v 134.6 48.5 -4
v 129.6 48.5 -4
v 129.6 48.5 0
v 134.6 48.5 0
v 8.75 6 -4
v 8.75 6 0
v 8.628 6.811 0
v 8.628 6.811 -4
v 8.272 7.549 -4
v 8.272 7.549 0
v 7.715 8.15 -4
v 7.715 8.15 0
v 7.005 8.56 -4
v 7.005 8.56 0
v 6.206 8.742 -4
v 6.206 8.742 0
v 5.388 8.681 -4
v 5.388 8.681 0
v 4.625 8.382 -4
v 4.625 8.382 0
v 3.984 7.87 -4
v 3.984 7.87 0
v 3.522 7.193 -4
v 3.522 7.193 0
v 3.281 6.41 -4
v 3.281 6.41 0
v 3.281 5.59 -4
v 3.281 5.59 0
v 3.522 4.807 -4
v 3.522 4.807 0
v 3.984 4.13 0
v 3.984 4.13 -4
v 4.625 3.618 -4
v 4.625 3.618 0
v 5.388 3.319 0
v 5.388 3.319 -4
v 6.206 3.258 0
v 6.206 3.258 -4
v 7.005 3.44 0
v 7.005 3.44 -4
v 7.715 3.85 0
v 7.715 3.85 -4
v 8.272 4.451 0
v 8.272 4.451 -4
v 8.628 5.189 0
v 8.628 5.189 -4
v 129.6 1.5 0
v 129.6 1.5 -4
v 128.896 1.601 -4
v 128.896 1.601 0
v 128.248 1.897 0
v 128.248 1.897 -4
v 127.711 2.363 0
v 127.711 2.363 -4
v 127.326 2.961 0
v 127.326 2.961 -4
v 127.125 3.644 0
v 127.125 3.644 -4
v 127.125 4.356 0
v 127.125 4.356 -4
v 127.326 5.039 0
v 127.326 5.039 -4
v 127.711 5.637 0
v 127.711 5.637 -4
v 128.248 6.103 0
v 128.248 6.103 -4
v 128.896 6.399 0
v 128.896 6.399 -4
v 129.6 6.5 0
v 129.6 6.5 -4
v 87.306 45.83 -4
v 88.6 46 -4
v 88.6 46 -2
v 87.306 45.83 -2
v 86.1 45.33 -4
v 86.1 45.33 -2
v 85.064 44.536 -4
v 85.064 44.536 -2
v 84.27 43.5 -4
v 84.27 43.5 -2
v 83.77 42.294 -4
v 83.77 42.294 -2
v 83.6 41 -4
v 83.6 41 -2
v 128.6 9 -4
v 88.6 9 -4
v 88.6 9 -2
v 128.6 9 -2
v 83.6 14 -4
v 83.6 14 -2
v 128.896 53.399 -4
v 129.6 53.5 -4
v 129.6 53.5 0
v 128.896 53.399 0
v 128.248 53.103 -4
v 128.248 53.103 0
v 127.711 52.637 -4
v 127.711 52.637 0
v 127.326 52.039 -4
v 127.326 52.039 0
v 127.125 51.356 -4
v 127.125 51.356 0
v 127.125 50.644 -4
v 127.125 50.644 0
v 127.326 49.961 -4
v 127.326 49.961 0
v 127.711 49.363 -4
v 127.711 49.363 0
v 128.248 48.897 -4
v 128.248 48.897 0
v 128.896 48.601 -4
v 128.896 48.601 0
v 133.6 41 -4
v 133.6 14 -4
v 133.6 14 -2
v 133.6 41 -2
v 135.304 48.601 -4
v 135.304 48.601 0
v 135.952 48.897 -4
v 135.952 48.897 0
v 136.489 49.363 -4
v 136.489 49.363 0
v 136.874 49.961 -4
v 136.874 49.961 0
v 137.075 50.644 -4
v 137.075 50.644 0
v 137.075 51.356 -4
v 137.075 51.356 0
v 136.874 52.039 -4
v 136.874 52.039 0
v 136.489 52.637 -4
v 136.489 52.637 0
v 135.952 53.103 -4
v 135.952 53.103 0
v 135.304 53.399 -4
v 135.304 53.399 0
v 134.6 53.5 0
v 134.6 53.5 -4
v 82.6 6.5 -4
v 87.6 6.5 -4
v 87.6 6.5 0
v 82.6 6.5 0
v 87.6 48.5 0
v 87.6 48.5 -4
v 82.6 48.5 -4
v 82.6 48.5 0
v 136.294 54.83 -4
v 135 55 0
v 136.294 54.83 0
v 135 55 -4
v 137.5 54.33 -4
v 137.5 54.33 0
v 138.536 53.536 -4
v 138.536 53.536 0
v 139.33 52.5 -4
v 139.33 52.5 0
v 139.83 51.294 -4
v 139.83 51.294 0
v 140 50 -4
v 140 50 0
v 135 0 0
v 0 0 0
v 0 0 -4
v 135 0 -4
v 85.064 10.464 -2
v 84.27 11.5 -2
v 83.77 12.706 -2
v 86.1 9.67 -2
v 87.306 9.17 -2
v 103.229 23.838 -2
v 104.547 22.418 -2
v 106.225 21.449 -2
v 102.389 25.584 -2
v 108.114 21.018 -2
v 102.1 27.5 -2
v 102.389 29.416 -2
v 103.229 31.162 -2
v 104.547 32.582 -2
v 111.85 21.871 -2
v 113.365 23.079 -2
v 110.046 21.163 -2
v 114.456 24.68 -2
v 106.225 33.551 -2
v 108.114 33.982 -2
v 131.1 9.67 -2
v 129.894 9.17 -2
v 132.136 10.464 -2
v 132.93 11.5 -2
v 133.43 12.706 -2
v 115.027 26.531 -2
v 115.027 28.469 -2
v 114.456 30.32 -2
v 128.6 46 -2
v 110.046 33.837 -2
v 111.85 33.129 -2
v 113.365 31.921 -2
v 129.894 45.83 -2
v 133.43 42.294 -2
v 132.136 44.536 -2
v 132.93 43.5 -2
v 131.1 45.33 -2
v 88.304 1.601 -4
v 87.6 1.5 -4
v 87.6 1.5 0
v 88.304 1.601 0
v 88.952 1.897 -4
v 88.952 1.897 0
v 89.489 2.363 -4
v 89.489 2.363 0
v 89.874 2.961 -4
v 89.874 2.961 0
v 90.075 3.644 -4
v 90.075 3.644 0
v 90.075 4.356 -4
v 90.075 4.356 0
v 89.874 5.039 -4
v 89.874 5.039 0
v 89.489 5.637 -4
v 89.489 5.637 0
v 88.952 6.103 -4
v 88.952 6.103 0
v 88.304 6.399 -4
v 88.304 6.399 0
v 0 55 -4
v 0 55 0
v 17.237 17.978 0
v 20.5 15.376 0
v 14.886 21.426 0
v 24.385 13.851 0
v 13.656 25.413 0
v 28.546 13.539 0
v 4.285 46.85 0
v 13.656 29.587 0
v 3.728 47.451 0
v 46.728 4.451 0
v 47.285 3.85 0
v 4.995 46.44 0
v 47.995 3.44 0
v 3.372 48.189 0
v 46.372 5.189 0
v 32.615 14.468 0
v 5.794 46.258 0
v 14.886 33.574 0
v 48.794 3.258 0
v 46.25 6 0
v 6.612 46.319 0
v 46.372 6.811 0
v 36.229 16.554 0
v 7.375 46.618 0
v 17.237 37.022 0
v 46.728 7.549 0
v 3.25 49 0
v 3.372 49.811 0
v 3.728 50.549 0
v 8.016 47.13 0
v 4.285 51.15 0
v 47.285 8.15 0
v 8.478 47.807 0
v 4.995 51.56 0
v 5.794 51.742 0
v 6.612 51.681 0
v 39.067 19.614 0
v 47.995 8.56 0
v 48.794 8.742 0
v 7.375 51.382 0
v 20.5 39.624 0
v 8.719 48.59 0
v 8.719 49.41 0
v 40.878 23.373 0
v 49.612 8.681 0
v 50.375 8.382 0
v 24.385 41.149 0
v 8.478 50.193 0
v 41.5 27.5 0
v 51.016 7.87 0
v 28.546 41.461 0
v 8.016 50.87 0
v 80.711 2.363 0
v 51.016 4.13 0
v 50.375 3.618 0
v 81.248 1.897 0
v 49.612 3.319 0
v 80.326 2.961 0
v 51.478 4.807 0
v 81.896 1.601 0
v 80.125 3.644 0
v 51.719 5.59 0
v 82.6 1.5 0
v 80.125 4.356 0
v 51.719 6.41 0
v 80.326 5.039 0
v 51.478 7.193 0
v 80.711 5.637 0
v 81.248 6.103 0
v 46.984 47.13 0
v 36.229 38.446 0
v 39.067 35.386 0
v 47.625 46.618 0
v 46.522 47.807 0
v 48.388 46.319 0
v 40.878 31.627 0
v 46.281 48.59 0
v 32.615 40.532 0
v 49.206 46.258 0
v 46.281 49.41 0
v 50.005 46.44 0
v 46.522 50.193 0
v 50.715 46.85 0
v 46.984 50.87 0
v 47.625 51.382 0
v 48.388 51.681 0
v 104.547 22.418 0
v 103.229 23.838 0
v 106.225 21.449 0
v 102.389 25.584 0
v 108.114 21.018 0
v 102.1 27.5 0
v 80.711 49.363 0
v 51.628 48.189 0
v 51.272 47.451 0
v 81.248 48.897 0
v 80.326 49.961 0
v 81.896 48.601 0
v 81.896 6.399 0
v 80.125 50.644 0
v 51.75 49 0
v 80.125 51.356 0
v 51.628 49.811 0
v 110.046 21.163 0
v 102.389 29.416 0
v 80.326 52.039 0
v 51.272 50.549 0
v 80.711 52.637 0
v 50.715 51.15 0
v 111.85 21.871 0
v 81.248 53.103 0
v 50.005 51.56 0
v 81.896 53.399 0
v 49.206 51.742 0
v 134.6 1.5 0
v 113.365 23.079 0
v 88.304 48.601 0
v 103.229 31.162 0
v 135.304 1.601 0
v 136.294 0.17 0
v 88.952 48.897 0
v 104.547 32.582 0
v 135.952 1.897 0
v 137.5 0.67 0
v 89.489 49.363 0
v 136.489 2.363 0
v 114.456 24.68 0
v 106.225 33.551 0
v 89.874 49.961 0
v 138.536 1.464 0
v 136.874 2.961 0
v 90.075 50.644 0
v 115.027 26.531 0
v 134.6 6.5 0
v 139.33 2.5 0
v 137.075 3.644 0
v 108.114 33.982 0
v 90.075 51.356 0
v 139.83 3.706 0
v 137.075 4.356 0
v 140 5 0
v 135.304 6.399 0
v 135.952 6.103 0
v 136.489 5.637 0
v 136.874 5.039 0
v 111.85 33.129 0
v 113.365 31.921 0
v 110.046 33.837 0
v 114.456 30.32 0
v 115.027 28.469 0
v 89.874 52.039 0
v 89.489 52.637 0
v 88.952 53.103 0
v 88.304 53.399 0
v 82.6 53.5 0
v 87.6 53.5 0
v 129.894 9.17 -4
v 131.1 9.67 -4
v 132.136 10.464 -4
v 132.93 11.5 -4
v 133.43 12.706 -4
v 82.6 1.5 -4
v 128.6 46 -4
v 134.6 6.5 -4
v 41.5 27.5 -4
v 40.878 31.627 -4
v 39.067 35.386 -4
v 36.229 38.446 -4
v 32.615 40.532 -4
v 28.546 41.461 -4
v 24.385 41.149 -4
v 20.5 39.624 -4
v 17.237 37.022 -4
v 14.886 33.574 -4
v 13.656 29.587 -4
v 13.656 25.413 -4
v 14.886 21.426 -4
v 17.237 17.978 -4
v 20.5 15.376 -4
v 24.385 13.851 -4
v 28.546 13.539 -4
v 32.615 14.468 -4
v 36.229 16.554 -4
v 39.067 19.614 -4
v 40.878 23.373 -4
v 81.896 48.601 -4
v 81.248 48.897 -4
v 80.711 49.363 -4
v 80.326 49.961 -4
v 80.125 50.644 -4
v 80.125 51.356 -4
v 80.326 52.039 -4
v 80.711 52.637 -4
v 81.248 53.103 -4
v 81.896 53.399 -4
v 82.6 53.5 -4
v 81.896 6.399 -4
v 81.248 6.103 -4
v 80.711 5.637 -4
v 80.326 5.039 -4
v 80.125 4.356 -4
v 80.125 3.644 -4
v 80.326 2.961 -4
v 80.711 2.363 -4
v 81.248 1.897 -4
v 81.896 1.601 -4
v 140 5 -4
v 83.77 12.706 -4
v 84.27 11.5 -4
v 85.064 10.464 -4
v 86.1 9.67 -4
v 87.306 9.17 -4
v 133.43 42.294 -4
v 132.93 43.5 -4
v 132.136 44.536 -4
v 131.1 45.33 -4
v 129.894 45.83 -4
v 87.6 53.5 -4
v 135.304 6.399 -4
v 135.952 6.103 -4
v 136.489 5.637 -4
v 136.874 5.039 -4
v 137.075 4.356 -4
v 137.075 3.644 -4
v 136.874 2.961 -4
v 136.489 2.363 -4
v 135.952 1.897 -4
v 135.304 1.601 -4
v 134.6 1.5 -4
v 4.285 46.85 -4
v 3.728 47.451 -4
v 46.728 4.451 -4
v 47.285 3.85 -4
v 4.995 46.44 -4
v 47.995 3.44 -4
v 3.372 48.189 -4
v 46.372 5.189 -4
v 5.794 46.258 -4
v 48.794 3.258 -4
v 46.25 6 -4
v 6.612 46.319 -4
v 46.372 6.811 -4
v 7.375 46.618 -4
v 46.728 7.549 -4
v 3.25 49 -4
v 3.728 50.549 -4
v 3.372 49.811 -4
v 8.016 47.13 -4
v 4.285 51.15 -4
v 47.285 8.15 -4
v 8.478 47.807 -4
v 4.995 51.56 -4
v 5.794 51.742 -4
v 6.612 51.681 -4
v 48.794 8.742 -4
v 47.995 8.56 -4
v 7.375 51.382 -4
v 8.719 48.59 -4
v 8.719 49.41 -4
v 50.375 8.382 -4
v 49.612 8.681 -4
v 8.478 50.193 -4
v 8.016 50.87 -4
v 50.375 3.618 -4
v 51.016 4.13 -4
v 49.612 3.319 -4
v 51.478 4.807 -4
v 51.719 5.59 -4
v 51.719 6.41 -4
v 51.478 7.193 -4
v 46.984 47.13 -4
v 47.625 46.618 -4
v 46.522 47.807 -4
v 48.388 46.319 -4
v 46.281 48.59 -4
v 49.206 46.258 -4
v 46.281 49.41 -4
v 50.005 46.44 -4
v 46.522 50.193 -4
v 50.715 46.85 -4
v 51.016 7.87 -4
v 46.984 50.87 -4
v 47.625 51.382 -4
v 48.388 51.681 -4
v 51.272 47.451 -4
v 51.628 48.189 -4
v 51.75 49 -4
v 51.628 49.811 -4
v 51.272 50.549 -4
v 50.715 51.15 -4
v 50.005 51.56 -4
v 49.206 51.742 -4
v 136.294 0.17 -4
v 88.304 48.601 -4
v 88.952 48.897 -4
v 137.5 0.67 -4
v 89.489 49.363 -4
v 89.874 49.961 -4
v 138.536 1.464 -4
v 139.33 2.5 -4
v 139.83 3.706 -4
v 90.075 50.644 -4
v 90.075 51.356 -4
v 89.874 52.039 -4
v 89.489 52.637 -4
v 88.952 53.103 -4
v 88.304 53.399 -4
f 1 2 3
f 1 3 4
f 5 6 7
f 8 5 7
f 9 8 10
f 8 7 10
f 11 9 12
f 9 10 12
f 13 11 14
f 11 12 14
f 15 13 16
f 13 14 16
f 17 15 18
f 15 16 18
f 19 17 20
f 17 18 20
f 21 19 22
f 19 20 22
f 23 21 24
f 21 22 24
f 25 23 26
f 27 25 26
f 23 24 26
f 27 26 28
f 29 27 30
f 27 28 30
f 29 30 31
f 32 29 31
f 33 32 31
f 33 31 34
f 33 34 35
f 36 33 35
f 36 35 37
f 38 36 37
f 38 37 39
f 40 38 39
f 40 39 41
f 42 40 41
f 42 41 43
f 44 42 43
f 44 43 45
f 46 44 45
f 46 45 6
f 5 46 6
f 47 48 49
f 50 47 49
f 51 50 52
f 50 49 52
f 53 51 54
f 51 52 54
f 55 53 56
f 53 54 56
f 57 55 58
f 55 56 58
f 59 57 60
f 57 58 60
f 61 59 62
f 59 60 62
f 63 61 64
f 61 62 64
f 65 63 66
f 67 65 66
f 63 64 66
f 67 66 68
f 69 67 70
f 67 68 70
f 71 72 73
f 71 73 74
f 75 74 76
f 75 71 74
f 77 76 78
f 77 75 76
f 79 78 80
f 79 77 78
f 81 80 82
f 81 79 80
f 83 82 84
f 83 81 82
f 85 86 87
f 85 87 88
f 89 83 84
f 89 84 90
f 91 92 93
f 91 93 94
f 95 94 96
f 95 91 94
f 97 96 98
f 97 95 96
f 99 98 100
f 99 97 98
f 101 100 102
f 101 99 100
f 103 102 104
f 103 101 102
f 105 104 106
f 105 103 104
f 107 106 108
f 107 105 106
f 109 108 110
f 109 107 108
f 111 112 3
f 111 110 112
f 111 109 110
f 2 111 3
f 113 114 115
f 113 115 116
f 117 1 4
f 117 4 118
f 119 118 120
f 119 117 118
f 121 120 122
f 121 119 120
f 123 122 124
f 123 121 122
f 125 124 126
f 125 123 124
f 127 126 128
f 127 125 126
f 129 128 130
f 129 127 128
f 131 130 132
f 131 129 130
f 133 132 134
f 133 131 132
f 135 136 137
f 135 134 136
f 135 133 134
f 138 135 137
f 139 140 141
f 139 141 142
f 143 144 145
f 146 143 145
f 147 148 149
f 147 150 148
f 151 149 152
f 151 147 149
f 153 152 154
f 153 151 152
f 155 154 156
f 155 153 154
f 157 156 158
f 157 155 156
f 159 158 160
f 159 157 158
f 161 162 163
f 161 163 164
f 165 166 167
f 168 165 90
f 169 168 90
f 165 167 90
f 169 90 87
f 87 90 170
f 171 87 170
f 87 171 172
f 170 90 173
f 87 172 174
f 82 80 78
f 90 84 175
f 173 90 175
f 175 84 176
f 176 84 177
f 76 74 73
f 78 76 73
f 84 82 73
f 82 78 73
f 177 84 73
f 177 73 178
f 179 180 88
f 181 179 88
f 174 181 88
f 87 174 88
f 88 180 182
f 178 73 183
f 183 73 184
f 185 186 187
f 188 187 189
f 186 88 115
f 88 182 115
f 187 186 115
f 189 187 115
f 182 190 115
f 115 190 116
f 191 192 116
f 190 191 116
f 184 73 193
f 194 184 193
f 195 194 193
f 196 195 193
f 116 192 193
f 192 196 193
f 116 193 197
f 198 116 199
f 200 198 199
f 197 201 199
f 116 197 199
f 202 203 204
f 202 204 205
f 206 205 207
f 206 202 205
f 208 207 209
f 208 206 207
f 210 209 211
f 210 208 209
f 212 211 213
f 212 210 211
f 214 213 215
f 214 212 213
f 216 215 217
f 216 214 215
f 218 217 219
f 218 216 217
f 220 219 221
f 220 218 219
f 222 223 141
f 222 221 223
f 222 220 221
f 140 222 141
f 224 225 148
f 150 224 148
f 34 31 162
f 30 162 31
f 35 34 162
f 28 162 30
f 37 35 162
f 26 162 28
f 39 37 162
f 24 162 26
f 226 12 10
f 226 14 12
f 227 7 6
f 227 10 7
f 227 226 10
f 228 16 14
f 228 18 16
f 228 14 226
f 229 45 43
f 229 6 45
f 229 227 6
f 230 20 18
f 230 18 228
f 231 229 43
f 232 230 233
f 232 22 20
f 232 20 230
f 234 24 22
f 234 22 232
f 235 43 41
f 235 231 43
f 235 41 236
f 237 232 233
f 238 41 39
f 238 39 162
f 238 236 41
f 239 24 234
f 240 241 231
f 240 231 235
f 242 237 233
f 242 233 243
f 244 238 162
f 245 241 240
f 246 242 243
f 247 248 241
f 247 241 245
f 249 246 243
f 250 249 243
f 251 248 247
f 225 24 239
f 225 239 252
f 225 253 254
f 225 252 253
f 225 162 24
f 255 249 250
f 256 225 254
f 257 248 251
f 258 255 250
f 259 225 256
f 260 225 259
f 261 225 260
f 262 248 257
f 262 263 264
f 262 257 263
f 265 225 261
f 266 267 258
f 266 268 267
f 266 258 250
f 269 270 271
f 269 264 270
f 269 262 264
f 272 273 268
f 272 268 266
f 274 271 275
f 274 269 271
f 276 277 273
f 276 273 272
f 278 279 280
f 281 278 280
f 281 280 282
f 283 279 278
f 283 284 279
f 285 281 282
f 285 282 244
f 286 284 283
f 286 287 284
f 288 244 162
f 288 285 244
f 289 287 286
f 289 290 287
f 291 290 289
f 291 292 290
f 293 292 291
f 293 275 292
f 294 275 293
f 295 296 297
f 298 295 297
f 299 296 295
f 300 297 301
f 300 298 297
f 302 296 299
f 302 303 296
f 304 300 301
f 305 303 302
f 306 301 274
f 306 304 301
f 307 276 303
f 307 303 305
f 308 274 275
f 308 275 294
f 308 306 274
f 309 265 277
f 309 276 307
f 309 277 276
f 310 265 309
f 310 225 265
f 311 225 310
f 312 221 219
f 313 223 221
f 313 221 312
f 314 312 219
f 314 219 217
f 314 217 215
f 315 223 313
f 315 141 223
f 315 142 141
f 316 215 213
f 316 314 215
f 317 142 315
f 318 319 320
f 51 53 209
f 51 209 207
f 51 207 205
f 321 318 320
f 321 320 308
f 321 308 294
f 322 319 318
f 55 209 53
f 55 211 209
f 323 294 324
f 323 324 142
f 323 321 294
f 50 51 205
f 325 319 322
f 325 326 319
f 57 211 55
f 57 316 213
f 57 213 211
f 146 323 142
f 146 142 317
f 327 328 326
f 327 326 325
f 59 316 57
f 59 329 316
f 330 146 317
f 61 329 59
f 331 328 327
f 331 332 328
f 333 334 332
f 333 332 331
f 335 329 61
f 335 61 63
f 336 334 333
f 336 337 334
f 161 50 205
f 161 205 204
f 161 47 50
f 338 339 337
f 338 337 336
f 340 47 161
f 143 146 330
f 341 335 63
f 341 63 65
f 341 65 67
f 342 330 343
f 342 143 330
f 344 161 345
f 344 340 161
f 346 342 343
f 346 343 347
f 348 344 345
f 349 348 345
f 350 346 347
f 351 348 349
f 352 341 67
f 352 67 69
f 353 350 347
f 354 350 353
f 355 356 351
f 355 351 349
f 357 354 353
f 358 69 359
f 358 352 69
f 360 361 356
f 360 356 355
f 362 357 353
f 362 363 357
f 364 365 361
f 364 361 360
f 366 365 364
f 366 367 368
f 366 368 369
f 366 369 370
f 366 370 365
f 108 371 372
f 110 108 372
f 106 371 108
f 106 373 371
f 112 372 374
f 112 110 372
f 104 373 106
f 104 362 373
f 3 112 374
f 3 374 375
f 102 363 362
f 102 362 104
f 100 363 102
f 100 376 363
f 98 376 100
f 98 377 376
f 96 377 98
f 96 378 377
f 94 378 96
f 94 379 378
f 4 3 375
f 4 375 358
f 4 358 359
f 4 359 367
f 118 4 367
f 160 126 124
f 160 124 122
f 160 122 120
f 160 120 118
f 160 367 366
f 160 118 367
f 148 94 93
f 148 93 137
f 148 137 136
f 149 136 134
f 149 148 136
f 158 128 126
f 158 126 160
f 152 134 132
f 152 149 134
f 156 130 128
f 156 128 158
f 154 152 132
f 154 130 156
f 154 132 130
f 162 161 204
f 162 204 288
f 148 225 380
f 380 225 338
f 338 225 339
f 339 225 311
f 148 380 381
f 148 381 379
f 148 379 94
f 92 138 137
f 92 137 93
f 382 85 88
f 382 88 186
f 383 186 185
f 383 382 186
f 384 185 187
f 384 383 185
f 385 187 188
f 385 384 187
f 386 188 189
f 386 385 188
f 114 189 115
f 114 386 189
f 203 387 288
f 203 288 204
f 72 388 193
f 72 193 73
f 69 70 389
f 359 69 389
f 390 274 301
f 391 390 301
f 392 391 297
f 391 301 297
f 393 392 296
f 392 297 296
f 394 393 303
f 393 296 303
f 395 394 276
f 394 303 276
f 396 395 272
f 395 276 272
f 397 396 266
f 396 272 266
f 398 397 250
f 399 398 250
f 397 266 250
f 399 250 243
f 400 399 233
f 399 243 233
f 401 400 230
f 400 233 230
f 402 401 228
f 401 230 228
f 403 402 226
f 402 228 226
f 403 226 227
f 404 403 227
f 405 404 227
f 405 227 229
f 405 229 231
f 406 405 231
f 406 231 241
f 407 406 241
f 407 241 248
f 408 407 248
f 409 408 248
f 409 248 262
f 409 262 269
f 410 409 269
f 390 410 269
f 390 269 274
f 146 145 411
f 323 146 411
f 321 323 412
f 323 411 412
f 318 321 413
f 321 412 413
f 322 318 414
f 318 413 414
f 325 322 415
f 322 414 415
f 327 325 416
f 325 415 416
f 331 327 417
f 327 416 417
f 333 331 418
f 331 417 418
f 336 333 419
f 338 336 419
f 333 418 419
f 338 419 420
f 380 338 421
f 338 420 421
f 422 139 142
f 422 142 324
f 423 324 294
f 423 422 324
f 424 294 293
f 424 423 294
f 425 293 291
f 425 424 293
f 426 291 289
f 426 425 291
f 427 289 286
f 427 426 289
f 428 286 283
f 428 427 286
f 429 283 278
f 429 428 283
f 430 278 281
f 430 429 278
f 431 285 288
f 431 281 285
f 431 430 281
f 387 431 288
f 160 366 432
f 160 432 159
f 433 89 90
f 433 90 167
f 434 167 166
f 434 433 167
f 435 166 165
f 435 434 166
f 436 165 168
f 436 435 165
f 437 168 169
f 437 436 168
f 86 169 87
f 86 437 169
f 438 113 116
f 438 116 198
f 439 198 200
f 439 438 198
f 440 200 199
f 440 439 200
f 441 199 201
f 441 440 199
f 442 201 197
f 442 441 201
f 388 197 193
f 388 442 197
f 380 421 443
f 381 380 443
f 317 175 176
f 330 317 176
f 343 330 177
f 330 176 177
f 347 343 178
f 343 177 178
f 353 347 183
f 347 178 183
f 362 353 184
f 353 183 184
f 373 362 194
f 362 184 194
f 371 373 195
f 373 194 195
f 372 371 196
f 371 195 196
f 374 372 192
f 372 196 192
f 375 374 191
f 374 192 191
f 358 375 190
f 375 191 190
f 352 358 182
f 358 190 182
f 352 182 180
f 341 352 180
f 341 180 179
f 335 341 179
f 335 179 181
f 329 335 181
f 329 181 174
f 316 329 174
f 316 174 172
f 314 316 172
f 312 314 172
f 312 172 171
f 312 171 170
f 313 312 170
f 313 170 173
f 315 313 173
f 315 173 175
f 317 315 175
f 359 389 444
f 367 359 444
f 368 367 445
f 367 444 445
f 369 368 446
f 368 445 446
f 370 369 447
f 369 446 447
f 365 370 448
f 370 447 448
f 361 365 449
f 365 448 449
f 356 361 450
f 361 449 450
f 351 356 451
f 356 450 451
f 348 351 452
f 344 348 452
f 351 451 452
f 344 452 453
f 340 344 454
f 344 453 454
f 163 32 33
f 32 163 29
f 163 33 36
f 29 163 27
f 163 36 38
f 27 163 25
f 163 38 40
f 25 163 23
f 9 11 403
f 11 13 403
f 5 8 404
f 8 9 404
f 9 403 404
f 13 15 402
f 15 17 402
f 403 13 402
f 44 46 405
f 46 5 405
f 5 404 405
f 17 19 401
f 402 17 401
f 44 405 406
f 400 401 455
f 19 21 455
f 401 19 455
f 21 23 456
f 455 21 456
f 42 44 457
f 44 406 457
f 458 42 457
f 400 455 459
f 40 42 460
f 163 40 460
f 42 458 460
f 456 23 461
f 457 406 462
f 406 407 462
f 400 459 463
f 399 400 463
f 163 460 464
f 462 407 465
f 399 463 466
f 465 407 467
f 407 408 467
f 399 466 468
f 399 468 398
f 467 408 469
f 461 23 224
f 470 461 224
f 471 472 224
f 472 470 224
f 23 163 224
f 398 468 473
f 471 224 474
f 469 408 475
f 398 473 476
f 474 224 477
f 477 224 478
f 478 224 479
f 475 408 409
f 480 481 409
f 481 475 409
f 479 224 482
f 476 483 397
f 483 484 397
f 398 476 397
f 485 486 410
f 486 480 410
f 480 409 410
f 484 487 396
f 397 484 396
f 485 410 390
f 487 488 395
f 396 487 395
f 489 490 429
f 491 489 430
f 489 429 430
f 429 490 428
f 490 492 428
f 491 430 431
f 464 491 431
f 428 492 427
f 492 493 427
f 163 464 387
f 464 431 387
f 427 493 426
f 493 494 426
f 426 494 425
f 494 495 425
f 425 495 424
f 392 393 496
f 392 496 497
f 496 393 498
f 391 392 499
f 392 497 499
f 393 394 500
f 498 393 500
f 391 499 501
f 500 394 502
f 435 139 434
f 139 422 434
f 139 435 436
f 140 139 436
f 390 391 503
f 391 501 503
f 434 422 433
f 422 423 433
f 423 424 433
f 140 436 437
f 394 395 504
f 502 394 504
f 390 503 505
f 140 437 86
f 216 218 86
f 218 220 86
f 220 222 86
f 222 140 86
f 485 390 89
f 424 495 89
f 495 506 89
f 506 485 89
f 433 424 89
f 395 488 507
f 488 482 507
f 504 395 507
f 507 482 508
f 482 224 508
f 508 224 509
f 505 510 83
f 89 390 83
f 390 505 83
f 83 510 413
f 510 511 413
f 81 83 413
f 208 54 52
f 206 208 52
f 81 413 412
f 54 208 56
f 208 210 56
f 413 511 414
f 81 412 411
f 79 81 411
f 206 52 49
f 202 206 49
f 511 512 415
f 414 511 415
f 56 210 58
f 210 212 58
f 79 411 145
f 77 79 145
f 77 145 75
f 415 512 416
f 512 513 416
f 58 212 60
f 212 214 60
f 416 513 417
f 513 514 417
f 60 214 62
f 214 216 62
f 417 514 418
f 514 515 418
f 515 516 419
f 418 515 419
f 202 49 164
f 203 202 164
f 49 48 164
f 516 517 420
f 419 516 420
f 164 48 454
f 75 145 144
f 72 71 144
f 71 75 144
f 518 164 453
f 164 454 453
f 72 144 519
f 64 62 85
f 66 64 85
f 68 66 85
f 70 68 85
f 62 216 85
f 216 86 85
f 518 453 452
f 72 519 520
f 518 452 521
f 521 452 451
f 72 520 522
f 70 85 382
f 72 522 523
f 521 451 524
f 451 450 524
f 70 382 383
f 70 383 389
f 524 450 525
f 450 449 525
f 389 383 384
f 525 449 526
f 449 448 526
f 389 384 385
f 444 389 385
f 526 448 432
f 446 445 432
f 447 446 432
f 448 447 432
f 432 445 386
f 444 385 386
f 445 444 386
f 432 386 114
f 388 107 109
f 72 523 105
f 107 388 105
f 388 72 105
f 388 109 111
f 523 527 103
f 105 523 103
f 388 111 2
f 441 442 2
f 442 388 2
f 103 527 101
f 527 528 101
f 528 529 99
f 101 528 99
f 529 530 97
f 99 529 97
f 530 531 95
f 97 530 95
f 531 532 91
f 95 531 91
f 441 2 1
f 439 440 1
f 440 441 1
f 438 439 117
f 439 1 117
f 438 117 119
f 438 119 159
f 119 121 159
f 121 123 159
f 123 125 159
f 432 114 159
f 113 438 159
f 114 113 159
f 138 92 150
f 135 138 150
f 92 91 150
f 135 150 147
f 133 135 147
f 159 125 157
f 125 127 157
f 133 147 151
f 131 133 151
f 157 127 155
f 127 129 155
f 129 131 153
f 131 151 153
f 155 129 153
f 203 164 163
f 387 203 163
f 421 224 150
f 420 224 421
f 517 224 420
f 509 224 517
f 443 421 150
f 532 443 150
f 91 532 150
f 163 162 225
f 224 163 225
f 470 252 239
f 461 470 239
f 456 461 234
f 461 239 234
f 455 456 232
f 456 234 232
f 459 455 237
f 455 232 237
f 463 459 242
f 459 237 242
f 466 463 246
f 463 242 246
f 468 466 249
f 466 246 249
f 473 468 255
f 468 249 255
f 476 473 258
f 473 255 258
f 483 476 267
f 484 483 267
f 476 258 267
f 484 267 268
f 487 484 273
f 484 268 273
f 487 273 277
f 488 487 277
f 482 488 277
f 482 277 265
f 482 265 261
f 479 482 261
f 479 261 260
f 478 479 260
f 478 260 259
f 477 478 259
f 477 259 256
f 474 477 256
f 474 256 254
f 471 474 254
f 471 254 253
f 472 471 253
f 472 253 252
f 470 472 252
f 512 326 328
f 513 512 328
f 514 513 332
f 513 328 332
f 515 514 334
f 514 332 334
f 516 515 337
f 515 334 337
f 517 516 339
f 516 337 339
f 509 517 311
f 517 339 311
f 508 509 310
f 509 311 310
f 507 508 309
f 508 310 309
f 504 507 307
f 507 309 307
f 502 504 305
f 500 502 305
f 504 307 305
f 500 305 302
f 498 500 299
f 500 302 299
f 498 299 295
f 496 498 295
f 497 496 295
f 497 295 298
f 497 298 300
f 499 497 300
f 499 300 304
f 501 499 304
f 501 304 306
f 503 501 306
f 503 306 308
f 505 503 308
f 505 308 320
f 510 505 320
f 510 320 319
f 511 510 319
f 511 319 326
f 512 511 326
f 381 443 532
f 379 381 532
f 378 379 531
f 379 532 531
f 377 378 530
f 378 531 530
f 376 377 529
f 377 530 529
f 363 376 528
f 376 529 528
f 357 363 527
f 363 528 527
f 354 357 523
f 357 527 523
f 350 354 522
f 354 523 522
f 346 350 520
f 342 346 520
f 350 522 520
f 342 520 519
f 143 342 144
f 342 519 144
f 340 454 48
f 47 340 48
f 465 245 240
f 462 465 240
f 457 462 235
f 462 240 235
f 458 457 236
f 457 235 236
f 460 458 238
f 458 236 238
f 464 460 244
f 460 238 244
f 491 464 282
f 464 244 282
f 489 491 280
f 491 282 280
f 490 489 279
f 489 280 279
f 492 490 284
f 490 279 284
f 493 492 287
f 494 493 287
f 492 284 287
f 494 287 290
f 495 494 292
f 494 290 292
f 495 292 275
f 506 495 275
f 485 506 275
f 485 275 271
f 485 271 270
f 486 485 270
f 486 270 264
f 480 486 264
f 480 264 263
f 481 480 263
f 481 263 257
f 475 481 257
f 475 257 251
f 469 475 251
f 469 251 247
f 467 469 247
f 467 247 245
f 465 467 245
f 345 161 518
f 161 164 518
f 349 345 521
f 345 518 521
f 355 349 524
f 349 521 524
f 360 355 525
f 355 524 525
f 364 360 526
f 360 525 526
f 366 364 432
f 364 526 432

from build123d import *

# Parameters (mm, degrees)
SCHIZZO1_W                   = 140
SCHIZZO1_H                   = 55
ESTRUSIONE_ESTRUSIONE1_DEPTH = 4
SCHIZZO2_R                   = 14
SCHIZZO2_R_2                 = 2.75
TAGLIO_ESTRUSIONE1_DEPTH     = 151.469265965
RACCORDO1_R                  = 5
SCHIZZO3_R                   = 6.5
TAGLIO_ESTRUSIONE2_DEPTH     = 151.469265965
TAGLIO_ESTRUSIONE3_DEPTH     = 2


with BuildPart() as part:
    # Schizzo1 → Estrusione-Estrusione1 (new body)
    with BuildSketch(Plane.XY):
        with Locations((70, 27.5)):
            Rectangle(SCHIZZO1_W, SCHIZZO1_H)
    extrude(amount=-ESTRUSIONE_ESTRUSIONE1_DEPTH)

    # Schizzo2 → Taglio-Estrusione1 (cut, through all)
    with BuildSketch(Plane.XY):
        with Locations((27.5, 27.5)):
            Circle(SCHIZZO2_R)
        with Locations((6, 6)):
            Circle(SCHIZZO2_R_2)
        with Locations(Location((49, 6, 0), (0, 0, 180))):
            Circle(SCHIZZO2_R_2)
        with Locations((49, 49)):
            Circle(SCHIZZO2_R_2)
        with Locations(Location((6, 49, 0), (0, 0, 180))):
            Circle(SCHIZZO2_R_2)
    extrude(amount=-TAGLIO_ESTRUSIONE1_DEPTH, mode=Mode.SUBTRACT)

    # Raccordo1
    raccordo1_edges = [part.edges().sort_by_distance(p)[0] for p in [
        (140, 55, -2),
        (140, 0, -2),
    ]]
    fillet(raccordo1_edges, radius=RACCORDO1_R)

    # Schizzo3 → Taglio-Estrusione2 (cut, through all)
    with BuildSketch(Plane(origin=(0, 0, -4), x_dir=(-1, 0, 0), z_dir=(0, 0, -1))):
        with Locations((-108.6, 27.5)):
            Circle(SCHIZZO3_R)
        with BuildLine():
            Line((-134.6, 53.5), (-129.6, 53.5))
            ThreePointArc((-129.6, 53.5), (-127.1, 51), (-129.6, 48.5))
            Line((-129.6, 48.5), (-134.6, 48.5))
            ThreePointArc((-134.6, 48.5), (-137.1, 51), (-134.6, 53.5))
        make_face()
        with BuildLine():
            Line((-82.6, 53.5), (-87.6, 53.5))
            ThreePointArc((-87.6, 53.5), (-90.1, 51), (-87.6, 48.5))
            Line((-87.6, 48.5), (-82.6, 48.5))
            ThreePointArc((-82.6, 48.5), (-80.1, 51), (-82.6, 53.5))
        make_face()
        with BuildLine():
            Line((-134.6, 1.5), (-129.6, 1.5))
            ThreePointArc((-129.6, 1.5), (-127.1, 4), (-129.6, 6.5))
            Line((-129.6, 6.5), (-134.6, 6.5))
            ThreePointArc((-134.6, 6.5), (-137.1, 4), (-134.6, 1.5))
        make_face()
        with BuildLine():
            Line((-82.6, 1.5), (-87.6, 1.5))
            ThreePointArc((-87.6, 1.5), (-90.1, 4), (-87.6, 6.5))
            Line((-87.6, 6.5), (-82.6, 6.5))
            ThreePointArc((-82.6, 6.5), (-80.1, 4), (-82.6, 1.5))
        make_face()
    extrude(amount=-TAGLIO_ESTRUSIONE2_DEPTH, mode=Mode.SUBTRACT)

    # Schizzo4 → Taglio-Estrusione3 (cut)
    with BuildSketch(Plane(origin=(0, 0, -4), x_dir=(-1, 0, 0), z_dir=(0, 0, -1))):
        with BuildLine():
            Line((-88.6, 9), (-128.6, 9))
            ThreePointArc((-128.6, 9), (-132.135533906, 10.464466094), (-133.6, 14))
            Line((-133.6, 14), (-133.6, 41))
            ThreePointArc((-133.6, 41), (-132.135533906, 44.535533906), (-128.6, 46))
            Line((-128.6, 46), (-88.6, 46))
            ThreePointArc((-88.6, 46), (-85.064466094, 44.535533906), (-83.6, 41))
            Line((-83.6, 41), (-83.6, 14))
            ThreePointArc((-83.6, 14), (-85.064466094, 10.464466094), (-88.6, 9))
        make_face()
    extrude(amount=-TAGLIO_ESTRUSIONE3_DEPTH, mode=Mode.SUBTRACT)


solid = part.part
